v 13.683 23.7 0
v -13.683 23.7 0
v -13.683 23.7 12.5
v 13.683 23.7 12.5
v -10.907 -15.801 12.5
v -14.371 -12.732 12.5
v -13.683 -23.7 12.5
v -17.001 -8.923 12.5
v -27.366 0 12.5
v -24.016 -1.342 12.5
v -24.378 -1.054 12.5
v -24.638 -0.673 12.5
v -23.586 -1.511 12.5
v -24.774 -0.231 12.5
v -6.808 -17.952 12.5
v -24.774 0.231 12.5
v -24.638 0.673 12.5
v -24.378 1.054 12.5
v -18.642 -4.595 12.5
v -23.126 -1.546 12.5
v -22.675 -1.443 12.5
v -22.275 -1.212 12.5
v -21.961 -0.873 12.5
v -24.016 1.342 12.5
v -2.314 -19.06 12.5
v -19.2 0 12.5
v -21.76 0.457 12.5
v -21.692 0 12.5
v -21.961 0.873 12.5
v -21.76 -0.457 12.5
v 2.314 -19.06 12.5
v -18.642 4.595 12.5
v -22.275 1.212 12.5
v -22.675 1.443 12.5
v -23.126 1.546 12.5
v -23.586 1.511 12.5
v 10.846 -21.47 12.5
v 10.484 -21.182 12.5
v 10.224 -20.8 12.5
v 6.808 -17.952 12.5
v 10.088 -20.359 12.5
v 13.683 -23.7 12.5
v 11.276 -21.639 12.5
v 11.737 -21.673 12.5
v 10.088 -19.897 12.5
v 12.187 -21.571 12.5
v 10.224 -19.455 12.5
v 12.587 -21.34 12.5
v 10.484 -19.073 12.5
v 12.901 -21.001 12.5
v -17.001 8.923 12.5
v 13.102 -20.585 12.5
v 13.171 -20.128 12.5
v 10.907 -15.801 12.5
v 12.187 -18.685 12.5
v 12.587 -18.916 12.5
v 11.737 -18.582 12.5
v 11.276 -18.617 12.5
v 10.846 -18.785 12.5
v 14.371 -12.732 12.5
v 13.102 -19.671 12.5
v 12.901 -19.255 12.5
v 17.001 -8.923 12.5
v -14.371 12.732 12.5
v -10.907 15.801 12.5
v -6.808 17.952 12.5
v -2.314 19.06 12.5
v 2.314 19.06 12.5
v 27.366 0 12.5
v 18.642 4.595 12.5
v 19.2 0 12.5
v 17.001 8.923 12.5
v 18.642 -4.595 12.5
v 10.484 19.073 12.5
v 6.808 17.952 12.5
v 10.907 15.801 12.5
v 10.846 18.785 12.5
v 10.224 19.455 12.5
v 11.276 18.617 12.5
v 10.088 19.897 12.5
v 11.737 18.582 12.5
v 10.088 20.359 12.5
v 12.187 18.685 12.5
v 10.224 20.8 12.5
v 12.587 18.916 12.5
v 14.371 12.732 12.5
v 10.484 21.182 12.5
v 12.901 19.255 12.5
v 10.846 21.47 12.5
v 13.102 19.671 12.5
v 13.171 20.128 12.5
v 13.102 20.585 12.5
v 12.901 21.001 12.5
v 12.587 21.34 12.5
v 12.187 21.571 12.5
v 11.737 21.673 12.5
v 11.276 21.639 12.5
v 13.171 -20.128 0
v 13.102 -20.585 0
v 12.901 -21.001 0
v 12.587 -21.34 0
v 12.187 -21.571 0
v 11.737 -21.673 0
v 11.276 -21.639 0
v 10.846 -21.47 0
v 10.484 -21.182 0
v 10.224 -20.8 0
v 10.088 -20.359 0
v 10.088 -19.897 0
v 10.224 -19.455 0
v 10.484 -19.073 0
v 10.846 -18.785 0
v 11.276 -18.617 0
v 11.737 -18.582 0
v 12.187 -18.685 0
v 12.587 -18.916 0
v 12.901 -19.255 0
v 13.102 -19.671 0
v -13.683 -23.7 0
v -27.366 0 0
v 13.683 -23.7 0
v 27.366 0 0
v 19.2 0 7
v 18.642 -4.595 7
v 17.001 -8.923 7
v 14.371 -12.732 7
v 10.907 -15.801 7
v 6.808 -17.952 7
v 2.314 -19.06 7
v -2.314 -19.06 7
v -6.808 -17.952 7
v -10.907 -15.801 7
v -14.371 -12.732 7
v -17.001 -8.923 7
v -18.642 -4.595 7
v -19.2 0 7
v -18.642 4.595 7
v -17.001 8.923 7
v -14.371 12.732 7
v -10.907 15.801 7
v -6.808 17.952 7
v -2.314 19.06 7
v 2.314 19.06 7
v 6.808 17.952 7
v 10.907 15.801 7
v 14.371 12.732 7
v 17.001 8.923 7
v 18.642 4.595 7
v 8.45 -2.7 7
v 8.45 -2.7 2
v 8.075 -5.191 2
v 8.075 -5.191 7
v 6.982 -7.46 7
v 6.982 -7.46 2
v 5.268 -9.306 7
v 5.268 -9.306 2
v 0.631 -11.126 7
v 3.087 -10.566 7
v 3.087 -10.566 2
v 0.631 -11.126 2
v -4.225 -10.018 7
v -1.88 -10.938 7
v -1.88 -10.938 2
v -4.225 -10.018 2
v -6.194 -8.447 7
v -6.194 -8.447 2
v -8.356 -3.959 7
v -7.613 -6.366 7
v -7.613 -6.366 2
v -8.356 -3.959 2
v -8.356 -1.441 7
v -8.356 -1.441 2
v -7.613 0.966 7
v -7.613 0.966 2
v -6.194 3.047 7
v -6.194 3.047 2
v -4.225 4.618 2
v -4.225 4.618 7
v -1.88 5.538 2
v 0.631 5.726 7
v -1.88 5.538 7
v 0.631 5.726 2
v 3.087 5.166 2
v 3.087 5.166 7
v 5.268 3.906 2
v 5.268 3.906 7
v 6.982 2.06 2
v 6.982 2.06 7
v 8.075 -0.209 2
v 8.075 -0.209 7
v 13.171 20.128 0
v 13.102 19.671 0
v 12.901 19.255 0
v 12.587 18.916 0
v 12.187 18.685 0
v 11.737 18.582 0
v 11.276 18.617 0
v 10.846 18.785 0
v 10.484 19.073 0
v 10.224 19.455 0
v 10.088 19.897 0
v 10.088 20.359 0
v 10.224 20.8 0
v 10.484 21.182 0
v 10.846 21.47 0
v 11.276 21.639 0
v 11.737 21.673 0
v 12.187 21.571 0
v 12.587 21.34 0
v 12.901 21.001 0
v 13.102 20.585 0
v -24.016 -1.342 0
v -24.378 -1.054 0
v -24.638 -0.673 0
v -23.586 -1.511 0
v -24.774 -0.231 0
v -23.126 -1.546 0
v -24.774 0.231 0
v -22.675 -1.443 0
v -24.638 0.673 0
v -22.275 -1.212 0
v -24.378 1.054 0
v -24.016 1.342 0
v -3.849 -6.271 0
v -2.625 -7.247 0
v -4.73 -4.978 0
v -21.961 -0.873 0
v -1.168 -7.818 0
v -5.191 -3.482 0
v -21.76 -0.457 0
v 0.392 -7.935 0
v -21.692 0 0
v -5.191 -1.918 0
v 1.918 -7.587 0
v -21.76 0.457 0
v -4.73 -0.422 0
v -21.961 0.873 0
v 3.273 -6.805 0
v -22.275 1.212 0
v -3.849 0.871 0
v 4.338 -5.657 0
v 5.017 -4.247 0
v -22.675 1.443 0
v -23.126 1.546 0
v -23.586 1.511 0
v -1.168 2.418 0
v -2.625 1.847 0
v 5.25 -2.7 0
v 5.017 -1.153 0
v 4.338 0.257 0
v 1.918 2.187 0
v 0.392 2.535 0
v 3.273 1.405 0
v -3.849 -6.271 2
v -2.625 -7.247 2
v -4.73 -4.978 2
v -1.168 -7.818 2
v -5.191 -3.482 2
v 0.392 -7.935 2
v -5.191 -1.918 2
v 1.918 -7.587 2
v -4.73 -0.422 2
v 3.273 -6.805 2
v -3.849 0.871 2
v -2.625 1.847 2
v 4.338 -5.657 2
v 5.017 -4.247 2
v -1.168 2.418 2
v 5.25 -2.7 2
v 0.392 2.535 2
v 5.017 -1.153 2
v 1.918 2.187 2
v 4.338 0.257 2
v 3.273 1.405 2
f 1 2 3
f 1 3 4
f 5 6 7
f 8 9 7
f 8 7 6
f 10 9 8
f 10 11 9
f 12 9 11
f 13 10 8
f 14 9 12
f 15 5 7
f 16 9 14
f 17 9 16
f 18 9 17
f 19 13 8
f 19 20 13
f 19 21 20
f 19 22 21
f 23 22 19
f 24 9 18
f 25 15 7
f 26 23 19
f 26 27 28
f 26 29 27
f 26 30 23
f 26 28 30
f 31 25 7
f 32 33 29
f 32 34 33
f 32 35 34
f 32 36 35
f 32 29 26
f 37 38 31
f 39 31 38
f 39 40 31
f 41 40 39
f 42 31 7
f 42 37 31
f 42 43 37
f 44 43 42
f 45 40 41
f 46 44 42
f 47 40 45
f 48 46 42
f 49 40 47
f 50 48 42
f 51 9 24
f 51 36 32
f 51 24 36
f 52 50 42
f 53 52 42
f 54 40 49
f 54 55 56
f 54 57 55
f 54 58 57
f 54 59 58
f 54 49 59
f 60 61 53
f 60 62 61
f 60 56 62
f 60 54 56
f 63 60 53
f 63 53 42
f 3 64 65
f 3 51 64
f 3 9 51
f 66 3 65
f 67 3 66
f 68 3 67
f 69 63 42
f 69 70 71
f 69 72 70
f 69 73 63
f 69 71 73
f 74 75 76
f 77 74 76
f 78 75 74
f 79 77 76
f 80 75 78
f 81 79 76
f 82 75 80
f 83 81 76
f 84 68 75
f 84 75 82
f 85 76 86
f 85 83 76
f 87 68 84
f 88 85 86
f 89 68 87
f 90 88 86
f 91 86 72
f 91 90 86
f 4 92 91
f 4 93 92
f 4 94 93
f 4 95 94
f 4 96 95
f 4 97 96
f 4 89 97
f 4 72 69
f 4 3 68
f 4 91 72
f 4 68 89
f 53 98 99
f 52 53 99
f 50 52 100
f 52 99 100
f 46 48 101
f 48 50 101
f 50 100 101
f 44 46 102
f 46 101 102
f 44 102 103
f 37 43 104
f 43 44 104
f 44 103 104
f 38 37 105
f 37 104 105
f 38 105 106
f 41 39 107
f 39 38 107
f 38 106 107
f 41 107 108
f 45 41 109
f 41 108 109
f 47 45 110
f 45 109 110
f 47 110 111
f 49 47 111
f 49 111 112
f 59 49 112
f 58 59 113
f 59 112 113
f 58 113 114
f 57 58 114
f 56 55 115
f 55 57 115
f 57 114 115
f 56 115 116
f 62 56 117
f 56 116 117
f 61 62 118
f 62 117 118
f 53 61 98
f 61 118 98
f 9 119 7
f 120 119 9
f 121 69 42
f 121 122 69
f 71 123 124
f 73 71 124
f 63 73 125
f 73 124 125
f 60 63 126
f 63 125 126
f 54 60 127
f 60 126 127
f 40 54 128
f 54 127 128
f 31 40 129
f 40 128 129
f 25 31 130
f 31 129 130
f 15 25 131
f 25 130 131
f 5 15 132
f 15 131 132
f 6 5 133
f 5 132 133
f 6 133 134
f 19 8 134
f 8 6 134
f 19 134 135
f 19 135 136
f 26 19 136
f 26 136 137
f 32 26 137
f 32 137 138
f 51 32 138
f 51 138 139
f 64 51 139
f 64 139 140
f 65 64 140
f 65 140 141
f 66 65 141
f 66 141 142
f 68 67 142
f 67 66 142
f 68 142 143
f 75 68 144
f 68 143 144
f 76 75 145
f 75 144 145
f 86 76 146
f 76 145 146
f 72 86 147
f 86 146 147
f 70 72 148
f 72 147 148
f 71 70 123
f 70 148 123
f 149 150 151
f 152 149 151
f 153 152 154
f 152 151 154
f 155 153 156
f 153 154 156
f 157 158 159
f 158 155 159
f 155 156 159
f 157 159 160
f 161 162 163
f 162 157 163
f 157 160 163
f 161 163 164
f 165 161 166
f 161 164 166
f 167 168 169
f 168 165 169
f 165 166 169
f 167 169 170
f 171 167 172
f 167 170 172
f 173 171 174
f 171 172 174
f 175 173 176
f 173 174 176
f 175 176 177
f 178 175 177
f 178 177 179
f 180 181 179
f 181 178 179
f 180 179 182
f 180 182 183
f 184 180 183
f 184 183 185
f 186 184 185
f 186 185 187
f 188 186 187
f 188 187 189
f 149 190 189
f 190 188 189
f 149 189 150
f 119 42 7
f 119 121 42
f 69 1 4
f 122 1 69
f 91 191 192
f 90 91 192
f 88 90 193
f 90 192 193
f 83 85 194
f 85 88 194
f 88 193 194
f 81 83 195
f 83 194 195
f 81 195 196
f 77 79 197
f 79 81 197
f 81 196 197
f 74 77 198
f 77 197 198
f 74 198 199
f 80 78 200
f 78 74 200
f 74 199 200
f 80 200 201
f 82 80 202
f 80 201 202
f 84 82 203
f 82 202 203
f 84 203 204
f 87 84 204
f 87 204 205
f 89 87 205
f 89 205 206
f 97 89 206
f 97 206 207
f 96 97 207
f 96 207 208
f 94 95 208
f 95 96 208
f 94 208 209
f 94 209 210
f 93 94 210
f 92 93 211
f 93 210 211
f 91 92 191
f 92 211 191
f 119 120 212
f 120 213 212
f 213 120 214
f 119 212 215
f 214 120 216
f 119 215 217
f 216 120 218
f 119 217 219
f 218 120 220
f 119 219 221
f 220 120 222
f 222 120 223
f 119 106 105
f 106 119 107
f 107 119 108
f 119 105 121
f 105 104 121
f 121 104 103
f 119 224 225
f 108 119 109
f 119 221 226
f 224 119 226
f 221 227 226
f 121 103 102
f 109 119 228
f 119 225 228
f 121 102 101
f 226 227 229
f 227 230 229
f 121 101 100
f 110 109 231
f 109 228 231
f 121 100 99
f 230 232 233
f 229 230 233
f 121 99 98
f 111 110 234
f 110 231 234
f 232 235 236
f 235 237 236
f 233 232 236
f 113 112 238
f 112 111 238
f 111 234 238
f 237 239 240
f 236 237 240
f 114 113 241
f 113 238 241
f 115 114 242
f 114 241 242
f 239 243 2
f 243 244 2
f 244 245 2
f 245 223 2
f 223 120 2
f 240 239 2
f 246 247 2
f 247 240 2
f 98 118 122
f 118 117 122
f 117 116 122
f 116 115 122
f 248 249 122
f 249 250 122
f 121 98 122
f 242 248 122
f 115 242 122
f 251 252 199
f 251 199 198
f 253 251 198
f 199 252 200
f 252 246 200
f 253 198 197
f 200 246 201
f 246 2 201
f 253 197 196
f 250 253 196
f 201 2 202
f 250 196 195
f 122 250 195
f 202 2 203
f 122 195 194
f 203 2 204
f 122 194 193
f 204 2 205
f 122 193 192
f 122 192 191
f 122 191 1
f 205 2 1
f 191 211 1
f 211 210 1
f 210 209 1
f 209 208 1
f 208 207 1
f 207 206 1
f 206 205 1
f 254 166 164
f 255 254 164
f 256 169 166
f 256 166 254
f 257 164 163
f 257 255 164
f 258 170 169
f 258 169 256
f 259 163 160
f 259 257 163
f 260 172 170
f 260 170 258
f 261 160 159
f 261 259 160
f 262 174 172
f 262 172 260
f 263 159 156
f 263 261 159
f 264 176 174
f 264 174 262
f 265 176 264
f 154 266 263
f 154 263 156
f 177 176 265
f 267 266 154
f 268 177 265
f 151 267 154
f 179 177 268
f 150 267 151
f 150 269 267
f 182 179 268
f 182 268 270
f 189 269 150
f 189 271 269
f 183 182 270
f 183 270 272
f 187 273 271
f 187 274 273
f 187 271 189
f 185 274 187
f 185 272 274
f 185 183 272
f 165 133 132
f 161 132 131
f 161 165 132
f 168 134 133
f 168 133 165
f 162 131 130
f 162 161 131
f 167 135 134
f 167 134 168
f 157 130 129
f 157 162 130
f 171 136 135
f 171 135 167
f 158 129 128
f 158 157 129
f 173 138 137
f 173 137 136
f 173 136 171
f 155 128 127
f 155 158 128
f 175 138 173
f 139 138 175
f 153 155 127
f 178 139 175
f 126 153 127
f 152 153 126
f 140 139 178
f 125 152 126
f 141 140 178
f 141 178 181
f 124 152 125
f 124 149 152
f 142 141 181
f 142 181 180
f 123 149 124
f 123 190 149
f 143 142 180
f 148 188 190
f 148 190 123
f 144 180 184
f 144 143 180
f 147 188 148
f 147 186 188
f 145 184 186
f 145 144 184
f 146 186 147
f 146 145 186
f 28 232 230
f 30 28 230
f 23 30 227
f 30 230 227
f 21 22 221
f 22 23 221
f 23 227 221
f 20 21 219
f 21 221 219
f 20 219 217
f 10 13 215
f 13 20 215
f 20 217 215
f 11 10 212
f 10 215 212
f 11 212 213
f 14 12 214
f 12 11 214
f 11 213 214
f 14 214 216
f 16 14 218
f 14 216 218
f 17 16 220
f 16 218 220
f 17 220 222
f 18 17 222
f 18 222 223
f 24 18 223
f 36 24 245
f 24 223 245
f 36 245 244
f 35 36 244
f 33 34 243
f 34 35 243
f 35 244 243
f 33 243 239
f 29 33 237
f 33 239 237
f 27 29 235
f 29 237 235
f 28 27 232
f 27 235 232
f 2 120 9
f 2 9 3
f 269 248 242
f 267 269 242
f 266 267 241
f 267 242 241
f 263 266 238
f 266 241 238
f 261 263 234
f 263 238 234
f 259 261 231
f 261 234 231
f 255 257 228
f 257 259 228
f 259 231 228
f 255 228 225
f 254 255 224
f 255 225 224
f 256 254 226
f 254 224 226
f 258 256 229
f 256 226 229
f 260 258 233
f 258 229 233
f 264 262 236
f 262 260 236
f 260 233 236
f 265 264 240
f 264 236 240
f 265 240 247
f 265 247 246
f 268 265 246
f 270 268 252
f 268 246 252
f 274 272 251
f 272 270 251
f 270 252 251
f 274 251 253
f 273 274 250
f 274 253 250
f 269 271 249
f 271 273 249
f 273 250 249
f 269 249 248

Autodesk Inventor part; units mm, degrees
ref_plane "YZ Plane" through (0, 0, 0) normal (1, 0, 0) x (0, 1, 0)
ref_plane "XZ Plane" through (0, 0, 0) normal (0, 1, 0) x (-1, 0, 0)
sketch "Sketch1" plane through (0, 0, 0) normal (0, 0, 1) x (1, 0, 0)
  circle A0 centre (0, 0) radius 19.2
  line L0 (-13.6832, 23.7) -> (13.6832, 23.7)
  line L1 (13.6832, 23.7) -> (27.3664, 0)
  line L2 (27.3664, 0) -> (13.6832, -23.7)
  line L3 (13.6832, -23.7) -> (-13.6832, -23.7)
  line L4 (-13.6832, -23.7) -> (-27.3664, 0)
  line L5 (-27.3664, 0) -> (-13.6832, 23.7)
  circle A1 centre (11.6207, 20.1277) radius 1.55
  line L6 (0, 23.7) -> (0, 19.2) construction
  circle A2 centre (0, -2.7) radius 5.25
  circle A3 centre (0, -2.7) radius 8.45
  line L7 (11.6207, 20.1277) -> (9.6, 16.6277) construction
  circle A4 centre (-23.2415, 0) radius 1.55
  circle A5 centre (11.6207, -20.1277) radius 1.55
  point P0 (0, 21.45)
  point P1 (0, -19.2)
  dimension "d1" = 3.1
  dimension "d2" = 4.5
  dimension "d23" = 10.5
  dimension "d24" = 16.9
  dimension "d46" = 3.5
  dimension "d47" = -30
  dimension "d50" = 360
  dimension "d53" = 16.5
  dimension "d54" = 2.7
extrude "Extrusion1" add sketch "Sketch1" along normal blind 2 contours A3
extrude "Extrusion2" add sketch "Sketch1" along normal blind 7 contours A0
extrude "Extrusion3" add sketch "Sketch1" along normal blind 12.5 contours L0 L1 L2 L3 L4 L5
sketch "Sketch2" plane through (0, 0, 12.5) normal (0, 0, 1) x (1, 0, 0)
  circle A0 centre (0, 0) radius 19.2 projected
  line L0 (0, -19.2) -> (0, -23.7) construction
  line L1 (-13.6832, -23.7) -> (13.6832, -23.7) projected
  line L2 (-11.0127, -15.7277) -> (-14.9991, -21.4209) construction
  line L3 (-18.2603, -5.9331) -> (-23.0436, -7.4873) construction
  line L4 (9.6, 16.6277) -> (13.6832, 23.7)
  line L5 (13.5765, -13.5765) -> (17.3496, -17.3496)
  line L6 (13.6832, -23.7) -> (27.3664, 0) projected
  line L7 (27.3664, 0) -> (13.6832, 23.7) projected
  line L8 (-27.3664, 0) -> (-13.6832, -23.7) projected
  circle A1 centre (0, -2.7) radius 5.25 projected
  line L9 (-11.0127, -15.7277) -> (-13.1923, -18.8405)
  arc A2 (-18.2603, -5.9331) -> (-13.1923, -18.8405) centre (91.7215, 29.8021) ccw
  dimension "d15" = 35
  dimension "d16" = 72
  dimension "d18" = 150
  dimension "d19" = 45
  dimension "d45" = 3.8
ref_plane "Work Plane1" through (0, 0, 12.5) normal (0, 0, 1) x (1, 0, 0)
sketch "Sketch3" plane through (0, 0, 12.5) normal (0, 0, 1) x (1, 0, 0)
  line L0 (-12.6187, -18.0213) -> (7.041, -31.7872)
  line L1 (-11.1058, -22.8345) -> (5.2772, -34.3061)
  line L2 (-11.1058, -22.8345) -> (-13.1923, -18.8405)
  line L3 (5.2772, -34.3061) -> (7.041, -31.7872)
  line L4 (-12.6187, -18.0213) -> (-13.1923, -18.8405)
  line L5 (-11.0127, -15.7277) -> (-13.1923, -18.8405) projected
  point P0 (0, 0)
  dimension "d36" = 6.15
  dimension "d41" = 20
  dimension "d43" = 2
  dimension "d55" = 4
properties part number "Case V2"
